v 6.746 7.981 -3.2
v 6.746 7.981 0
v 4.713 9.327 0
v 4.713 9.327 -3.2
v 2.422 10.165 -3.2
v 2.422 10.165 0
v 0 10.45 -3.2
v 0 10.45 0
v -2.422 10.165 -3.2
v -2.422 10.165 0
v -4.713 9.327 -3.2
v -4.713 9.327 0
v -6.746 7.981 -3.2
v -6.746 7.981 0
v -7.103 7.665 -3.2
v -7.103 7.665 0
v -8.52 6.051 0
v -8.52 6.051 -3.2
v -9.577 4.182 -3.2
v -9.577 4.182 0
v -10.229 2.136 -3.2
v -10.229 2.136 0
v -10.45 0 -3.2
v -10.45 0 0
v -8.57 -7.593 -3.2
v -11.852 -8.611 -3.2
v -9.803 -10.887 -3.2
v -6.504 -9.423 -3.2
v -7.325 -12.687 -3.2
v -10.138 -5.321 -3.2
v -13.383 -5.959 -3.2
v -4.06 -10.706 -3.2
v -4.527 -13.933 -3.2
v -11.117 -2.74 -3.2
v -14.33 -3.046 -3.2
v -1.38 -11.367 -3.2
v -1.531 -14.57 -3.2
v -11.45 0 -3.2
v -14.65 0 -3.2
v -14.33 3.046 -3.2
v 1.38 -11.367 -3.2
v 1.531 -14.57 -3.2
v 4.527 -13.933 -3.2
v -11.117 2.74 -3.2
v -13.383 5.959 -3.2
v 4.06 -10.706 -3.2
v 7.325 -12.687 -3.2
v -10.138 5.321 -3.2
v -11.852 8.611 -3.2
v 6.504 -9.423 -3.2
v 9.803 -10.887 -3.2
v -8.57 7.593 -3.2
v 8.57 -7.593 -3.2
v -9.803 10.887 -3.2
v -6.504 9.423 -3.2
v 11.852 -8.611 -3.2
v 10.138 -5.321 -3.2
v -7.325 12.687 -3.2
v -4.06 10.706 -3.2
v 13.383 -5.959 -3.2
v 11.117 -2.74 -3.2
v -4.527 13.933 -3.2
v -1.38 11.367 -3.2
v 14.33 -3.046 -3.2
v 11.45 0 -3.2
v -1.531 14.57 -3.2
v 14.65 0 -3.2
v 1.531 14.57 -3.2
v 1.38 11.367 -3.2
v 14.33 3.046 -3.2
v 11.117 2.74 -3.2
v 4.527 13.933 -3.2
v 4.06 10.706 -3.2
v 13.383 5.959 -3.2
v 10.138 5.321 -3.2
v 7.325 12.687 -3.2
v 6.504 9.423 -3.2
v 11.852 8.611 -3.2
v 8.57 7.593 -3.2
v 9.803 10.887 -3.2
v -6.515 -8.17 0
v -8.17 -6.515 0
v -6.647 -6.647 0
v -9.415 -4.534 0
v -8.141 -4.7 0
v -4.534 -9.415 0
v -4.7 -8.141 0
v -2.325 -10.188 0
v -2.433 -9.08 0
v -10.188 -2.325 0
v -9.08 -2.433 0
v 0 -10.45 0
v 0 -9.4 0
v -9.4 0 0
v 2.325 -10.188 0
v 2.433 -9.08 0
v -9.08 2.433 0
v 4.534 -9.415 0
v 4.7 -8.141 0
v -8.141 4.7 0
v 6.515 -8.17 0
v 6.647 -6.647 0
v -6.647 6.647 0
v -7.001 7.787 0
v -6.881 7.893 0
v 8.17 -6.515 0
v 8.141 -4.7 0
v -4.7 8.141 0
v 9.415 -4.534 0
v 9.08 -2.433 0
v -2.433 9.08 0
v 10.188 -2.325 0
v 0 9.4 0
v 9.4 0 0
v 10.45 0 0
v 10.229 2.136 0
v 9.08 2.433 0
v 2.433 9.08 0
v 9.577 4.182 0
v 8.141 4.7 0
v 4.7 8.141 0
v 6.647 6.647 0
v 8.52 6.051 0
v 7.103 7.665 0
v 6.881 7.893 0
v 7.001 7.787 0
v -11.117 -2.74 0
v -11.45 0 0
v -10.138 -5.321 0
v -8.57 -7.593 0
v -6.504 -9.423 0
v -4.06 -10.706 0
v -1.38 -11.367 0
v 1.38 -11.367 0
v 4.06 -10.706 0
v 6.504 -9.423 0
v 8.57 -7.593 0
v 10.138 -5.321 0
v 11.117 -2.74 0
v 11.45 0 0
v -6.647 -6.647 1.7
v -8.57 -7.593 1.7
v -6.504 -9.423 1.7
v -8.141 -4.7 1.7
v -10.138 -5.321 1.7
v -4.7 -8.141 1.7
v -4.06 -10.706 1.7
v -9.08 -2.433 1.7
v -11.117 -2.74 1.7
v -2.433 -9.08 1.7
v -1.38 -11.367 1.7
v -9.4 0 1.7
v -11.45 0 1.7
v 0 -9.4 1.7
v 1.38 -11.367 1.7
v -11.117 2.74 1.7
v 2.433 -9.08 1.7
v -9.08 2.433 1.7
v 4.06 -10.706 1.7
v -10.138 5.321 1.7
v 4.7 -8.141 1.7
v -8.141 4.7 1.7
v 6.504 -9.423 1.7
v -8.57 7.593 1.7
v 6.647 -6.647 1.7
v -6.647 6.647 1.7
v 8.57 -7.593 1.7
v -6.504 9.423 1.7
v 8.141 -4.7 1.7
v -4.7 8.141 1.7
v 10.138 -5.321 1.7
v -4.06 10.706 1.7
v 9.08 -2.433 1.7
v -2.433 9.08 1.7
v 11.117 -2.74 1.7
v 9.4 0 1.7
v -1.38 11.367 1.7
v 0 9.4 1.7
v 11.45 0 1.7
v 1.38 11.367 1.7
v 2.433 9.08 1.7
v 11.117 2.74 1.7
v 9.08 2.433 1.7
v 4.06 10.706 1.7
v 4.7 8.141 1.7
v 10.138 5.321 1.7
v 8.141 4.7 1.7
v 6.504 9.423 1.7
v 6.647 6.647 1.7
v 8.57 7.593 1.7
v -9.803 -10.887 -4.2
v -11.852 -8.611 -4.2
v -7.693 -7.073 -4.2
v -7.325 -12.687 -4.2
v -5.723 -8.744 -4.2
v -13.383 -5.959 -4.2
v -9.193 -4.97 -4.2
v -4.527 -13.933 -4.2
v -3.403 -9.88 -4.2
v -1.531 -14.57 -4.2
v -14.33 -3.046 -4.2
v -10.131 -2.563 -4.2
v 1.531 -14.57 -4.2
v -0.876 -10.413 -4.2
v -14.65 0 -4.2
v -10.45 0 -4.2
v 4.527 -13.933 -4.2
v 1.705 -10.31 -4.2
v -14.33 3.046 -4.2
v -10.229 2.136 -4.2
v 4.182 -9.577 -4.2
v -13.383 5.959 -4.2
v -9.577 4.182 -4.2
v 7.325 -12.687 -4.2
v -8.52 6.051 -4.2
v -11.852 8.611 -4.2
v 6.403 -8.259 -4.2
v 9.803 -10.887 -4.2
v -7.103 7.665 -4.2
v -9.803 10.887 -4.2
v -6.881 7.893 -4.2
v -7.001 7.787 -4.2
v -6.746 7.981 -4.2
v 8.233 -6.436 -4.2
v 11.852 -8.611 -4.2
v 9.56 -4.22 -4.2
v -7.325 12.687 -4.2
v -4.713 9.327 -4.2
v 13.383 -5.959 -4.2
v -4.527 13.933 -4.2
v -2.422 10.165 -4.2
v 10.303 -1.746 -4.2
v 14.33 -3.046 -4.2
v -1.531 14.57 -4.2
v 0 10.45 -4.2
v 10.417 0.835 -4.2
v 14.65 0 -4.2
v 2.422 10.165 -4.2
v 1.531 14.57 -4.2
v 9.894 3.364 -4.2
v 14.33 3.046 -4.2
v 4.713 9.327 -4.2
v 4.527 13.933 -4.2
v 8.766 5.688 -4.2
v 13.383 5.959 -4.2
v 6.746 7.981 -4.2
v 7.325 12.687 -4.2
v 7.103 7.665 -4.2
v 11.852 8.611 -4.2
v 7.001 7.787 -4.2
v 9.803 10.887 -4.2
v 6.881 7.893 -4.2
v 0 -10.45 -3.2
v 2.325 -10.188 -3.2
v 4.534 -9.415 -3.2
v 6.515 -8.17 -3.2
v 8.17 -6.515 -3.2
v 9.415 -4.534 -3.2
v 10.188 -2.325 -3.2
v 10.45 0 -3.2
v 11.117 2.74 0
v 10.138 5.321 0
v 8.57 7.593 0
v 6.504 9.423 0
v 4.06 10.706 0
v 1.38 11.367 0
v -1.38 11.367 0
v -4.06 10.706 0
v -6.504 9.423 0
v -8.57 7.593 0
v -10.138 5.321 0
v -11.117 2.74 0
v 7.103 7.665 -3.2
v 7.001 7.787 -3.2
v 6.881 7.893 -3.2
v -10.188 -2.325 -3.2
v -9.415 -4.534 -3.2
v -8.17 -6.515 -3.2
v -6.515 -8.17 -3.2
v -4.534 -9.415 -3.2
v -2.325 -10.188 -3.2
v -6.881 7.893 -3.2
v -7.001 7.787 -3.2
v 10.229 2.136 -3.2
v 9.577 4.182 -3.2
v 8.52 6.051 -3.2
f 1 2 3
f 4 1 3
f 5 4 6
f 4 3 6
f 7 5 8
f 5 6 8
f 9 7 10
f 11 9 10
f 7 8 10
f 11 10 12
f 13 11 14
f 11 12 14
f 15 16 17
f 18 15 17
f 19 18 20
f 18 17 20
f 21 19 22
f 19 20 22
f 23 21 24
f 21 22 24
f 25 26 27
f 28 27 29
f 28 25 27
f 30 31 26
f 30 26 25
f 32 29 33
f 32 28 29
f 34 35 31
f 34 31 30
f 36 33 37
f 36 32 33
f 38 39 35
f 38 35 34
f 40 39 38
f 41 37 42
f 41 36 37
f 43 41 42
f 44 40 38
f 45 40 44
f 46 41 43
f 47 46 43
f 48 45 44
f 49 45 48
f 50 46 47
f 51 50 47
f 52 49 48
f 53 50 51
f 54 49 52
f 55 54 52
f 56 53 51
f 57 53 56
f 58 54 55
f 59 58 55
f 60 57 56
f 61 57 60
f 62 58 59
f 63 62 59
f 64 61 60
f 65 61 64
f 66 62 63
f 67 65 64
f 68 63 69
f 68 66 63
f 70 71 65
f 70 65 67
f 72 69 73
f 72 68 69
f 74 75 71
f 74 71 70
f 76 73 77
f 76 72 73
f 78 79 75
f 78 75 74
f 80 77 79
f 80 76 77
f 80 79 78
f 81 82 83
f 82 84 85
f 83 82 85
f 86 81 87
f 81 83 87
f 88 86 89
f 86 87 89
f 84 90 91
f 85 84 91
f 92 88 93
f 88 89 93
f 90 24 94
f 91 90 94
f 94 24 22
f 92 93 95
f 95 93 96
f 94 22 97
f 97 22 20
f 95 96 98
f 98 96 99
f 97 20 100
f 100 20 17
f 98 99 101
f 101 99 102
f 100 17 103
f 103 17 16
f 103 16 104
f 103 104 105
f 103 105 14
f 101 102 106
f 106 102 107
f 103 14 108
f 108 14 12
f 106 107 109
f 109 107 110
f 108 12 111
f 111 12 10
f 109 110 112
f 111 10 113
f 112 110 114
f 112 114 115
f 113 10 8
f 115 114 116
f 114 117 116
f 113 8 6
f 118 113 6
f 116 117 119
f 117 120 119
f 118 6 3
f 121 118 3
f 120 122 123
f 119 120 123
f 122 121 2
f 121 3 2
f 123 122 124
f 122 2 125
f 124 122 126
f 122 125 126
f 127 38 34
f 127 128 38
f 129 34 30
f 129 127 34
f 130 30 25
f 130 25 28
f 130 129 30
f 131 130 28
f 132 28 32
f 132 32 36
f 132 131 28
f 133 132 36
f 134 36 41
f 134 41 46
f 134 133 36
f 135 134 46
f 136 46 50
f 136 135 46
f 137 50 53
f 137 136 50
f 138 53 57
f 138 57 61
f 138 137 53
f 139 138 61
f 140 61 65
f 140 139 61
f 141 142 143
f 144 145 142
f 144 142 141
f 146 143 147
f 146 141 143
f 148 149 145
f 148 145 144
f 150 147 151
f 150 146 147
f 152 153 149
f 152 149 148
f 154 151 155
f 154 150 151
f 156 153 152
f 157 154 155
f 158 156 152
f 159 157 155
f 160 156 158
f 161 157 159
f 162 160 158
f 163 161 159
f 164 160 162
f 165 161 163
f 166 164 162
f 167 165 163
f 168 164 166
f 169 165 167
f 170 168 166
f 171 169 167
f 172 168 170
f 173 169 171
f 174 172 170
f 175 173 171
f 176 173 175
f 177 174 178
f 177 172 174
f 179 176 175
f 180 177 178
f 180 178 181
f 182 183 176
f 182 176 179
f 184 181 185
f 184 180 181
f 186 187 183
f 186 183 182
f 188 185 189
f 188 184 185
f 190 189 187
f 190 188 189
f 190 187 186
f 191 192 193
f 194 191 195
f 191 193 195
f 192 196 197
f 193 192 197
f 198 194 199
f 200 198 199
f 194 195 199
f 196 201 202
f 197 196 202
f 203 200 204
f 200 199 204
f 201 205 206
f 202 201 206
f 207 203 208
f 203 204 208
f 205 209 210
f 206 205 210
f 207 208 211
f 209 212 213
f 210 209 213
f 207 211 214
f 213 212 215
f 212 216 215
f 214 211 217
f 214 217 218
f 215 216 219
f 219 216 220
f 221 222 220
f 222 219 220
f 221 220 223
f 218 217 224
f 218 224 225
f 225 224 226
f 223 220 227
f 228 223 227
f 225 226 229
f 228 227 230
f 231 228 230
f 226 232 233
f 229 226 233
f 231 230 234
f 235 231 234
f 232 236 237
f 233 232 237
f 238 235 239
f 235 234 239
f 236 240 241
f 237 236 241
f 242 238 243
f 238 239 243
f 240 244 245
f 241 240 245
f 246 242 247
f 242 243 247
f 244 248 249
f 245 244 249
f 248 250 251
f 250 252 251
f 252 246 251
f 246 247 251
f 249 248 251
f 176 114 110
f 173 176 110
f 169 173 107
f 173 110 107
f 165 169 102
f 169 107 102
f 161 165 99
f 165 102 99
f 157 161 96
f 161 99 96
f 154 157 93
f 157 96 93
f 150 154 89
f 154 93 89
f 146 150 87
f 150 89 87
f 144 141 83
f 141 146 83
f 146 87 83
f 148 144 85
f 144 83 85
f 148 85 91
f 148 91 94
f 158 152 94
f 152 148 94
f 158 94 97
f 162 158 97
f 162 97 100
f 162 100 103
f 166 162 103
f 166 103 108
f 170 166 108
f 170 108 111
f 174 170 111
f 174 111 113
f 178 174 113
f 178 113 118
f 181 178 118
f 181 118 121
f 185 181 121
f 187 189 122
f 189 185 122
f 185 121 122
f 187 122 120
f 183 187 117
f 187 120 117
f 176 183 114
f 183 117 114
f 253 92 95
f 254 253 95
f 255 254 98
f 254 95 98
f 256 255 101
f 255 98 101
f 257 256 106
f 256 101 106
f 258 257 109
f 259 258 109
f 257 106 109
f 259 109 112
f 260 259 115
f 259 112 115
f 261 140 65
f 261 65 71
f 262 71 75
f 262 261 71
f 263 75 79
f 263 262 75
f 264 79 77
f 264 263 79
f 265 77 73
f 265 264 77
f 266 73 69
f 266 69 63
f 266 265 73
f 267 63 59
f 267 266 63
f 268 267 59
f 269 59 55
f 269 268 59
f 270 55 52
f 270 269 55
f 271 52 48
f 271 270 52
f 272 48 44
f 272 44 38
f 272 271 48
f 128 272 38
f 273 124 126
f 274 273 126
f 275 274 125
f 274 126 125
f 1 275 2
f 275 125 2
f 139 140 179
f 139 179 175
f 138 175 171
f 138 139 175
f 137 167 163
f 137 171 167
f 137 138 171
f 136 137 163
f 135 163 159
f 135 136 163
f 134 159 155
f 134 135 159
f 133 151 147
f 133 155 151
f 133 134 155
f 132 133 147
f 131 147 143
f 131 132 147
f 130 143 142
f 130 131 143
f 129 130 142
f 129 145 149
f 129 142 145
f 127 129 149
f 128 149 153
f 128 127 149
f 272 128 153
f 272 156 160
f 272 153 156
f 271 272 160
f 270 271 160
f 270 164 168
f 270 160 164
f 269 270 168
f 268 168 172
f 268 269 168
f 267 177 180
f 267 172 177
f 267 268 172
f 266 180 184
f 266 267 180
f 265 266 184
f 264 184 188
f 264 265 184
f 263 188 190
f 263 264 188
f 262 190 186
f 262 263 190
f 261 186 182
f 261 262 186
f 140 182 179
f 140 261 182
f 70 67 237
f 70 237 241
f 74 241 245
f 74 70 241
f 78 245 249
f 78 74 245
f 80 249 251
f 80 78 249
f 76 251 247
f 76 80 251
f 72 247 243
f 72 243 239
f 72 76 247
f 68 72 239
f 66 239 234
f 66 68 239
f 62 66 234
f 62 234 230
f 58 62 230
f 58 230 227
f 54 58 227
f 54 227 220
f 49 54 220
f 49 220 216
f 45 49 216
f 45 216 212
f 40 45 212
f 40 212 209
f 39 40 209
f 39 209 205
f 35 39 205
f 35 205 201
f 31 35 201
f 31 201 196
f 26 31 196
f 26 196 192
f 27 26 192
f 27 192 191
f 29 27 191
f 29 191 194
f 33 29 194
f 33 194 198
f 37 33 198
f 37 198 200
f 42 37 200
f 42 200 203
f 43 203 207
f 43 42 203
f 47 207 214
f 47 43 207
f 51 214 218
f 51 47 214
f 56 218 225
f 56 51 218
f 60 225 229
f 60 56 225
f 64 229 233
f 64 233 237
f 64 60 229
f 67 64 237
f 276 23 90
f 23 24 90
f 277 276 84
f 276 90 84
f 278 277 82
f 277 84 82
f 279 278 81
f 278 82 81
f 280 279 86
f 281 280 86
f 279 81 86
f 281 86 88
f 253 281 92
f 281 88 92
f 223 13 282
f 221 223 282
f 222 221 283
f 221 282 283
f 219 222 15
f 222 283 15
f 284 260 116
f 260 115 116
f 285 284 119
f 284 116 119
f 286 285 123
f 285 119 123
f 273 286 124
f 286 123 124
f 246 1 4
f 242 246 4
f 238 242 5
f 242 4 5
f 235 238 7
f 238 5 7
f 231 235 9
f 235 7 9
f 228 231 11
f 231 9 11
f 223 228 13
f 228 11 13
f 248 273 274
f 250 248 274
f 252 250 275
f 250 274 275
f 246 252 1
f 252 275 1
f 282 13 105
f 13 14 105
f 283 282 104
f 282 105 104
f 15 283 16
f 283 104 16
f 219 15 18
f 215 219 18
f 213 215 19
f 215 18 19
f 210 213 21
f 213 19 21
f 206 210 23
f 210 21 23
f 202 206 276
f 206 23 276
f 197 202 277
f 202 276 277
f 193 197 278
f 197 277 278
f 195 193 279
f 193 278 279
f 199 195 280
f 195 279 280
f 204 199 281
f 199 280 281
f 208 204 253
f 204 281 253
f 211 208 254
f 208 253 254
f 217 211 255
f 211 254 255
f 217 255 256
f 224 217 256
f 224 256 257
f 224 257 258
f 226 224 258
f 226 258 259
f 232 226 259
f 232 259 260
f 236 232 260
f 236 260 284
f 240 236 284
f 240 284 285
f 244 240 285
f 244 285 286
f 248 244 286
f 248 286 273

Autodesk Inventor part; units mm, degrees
ref_plane "YZ Plane" through (0, 0, 0) normal (1, 0, 0) x (0, 1, 0)
ref_plane "XZ Plane" through (0, 0, 0) normal (0, 1, 0) x (-1, 0, 0)
ref_plane "XY Plane" through (0, 0, 0) normal (0, 0, 1) x (1, 0, 0)
sketch "Sketch1" plane through (0, 0, 0) normal (0, 0, 1) x (1, 0, 0)
  circle A0 centre (0, 0) radius 9.4
  circle A1 centre (0, 0) radius 10.45
  circle A2 centre (0, 0) radius 7
  line L0 (0, 0) -> (0, 1.4)
  line L1 (0, 1.4) -> (-5.6, 1.4)
  line L2 (-6, 1.8) -> (-6, 5.8)
  line L3 (-5.6, 6.2) -> (0, 6.2)
  arc A3 (-6, 1.8) -> (-5.6, 1.4) centre (-5.6, 1.8) ccw
  arc A4 (-5.6, 6.2) -> (-6, 5.8) centre (-5.6, 5.8) ccw
  line L4 (0, 1.4) -> (5.6, 1.4)
  line L5 (6, 1.8) -> (6, 5.8)
  line L6 (5.6, 6.2) -> (0, 6.2)
  arc A5 (5.6, 1.4) -> (6, 1.8) centre (5.6, 1.8) ccw
  arc A6 (6, 5.8) -> (5.6, 6.2) centre (5.6, 5.8) ccw
  circle A7 centre (0, -9.4) radius 1.05
  line L7 (5.8828, 6.0828) -> (6.2306, 7.0384)
  line L8 (5.8828, 6.0828) -> (6.8997, 6.0828) construction
  circle A8 centre (6.2306, 7.0384) radius 1.0741
  circle A9 centre (-6.2306, 7.0384) radius 1.0741
  line L9 (0, 6.2) -> (0, 1.4)
  line L10 (-4.5, 2.55) -> (4.5, 2.55)
  line L11 (4.5, 2.55) -> (4.5, 5.05)
  line L12 (4.5, 5.05) -> (-4.5, 5.05)
  line L13 (-4.5, 5.05) -> (-4.5, 2.55)
  line L14 (-4.5, 2.55) -> (4.5, 5.05) construction
  line L15 (4.5, 2.55) -> (-4.5, 5.05) construction
  line L16 (-10.45, 0) -> (-11.45, 0)
  circle A10 centre (0, 0) radius 11.45
  line L17 (-11.45, 0) -> (-14.65, 0)
  circle A11 centre (0, 0) radius 14.65
  point P0 (-6, 1.4)
  point P1 (-6, 6.2)
  point P2 (1.0484, -9.3414)
  point P3 (-1.0484, -9.3414)
  point P4 (7.1035, 7.6644)
  point P5 (6.7461, 7.9808)
  point P6 (5.387, 7.7033)
  point P7 (6.9929, 6.2816)
  point P8 (-7.1035, 7.6644)
  point P9 (-6.9929, 6.2816)
  point P10 (-5.387, 7.7033)
  point P11 (-6.7461, 7.9808)
  point P12 (0, 3.8)
  dimension "d1" = 20.9
  dimension "d0" = 18.8
  dimension "d8" = 14
  dimension "d18" = 1.4
  dimension "d19" = 6
  dimension "d20" = 4.8
  dimension "d21" = 0.4
  dimension "d22" = 70
  dimension "d25" = 9
  dimension "d26" = 2.5
  dimension "d31" = 1
  dimension "d32" = 3.2
extrude "Extrusion7" add sketch "Sketch1" along normal blind 1.7 contours A0 A8 A1 A7 | A0 A8 A1 | A7 A0 | A7 A1 A9 A0 | A0 A9 A1 A8 | A10 | A1 A8 | A9 A1 A0 | A9 A1 picked at (0, -9.7457)
extrude "Extrusion8" add sketch "Sketch1" against normal blind 3.2 from surface at 0 contours A10
extrude "Extrusion9" add sketch "Sketch1" against normal blind 1 from surface at -3.2 contours A10 | A11
properties part number "fingerprint sensor seal"
